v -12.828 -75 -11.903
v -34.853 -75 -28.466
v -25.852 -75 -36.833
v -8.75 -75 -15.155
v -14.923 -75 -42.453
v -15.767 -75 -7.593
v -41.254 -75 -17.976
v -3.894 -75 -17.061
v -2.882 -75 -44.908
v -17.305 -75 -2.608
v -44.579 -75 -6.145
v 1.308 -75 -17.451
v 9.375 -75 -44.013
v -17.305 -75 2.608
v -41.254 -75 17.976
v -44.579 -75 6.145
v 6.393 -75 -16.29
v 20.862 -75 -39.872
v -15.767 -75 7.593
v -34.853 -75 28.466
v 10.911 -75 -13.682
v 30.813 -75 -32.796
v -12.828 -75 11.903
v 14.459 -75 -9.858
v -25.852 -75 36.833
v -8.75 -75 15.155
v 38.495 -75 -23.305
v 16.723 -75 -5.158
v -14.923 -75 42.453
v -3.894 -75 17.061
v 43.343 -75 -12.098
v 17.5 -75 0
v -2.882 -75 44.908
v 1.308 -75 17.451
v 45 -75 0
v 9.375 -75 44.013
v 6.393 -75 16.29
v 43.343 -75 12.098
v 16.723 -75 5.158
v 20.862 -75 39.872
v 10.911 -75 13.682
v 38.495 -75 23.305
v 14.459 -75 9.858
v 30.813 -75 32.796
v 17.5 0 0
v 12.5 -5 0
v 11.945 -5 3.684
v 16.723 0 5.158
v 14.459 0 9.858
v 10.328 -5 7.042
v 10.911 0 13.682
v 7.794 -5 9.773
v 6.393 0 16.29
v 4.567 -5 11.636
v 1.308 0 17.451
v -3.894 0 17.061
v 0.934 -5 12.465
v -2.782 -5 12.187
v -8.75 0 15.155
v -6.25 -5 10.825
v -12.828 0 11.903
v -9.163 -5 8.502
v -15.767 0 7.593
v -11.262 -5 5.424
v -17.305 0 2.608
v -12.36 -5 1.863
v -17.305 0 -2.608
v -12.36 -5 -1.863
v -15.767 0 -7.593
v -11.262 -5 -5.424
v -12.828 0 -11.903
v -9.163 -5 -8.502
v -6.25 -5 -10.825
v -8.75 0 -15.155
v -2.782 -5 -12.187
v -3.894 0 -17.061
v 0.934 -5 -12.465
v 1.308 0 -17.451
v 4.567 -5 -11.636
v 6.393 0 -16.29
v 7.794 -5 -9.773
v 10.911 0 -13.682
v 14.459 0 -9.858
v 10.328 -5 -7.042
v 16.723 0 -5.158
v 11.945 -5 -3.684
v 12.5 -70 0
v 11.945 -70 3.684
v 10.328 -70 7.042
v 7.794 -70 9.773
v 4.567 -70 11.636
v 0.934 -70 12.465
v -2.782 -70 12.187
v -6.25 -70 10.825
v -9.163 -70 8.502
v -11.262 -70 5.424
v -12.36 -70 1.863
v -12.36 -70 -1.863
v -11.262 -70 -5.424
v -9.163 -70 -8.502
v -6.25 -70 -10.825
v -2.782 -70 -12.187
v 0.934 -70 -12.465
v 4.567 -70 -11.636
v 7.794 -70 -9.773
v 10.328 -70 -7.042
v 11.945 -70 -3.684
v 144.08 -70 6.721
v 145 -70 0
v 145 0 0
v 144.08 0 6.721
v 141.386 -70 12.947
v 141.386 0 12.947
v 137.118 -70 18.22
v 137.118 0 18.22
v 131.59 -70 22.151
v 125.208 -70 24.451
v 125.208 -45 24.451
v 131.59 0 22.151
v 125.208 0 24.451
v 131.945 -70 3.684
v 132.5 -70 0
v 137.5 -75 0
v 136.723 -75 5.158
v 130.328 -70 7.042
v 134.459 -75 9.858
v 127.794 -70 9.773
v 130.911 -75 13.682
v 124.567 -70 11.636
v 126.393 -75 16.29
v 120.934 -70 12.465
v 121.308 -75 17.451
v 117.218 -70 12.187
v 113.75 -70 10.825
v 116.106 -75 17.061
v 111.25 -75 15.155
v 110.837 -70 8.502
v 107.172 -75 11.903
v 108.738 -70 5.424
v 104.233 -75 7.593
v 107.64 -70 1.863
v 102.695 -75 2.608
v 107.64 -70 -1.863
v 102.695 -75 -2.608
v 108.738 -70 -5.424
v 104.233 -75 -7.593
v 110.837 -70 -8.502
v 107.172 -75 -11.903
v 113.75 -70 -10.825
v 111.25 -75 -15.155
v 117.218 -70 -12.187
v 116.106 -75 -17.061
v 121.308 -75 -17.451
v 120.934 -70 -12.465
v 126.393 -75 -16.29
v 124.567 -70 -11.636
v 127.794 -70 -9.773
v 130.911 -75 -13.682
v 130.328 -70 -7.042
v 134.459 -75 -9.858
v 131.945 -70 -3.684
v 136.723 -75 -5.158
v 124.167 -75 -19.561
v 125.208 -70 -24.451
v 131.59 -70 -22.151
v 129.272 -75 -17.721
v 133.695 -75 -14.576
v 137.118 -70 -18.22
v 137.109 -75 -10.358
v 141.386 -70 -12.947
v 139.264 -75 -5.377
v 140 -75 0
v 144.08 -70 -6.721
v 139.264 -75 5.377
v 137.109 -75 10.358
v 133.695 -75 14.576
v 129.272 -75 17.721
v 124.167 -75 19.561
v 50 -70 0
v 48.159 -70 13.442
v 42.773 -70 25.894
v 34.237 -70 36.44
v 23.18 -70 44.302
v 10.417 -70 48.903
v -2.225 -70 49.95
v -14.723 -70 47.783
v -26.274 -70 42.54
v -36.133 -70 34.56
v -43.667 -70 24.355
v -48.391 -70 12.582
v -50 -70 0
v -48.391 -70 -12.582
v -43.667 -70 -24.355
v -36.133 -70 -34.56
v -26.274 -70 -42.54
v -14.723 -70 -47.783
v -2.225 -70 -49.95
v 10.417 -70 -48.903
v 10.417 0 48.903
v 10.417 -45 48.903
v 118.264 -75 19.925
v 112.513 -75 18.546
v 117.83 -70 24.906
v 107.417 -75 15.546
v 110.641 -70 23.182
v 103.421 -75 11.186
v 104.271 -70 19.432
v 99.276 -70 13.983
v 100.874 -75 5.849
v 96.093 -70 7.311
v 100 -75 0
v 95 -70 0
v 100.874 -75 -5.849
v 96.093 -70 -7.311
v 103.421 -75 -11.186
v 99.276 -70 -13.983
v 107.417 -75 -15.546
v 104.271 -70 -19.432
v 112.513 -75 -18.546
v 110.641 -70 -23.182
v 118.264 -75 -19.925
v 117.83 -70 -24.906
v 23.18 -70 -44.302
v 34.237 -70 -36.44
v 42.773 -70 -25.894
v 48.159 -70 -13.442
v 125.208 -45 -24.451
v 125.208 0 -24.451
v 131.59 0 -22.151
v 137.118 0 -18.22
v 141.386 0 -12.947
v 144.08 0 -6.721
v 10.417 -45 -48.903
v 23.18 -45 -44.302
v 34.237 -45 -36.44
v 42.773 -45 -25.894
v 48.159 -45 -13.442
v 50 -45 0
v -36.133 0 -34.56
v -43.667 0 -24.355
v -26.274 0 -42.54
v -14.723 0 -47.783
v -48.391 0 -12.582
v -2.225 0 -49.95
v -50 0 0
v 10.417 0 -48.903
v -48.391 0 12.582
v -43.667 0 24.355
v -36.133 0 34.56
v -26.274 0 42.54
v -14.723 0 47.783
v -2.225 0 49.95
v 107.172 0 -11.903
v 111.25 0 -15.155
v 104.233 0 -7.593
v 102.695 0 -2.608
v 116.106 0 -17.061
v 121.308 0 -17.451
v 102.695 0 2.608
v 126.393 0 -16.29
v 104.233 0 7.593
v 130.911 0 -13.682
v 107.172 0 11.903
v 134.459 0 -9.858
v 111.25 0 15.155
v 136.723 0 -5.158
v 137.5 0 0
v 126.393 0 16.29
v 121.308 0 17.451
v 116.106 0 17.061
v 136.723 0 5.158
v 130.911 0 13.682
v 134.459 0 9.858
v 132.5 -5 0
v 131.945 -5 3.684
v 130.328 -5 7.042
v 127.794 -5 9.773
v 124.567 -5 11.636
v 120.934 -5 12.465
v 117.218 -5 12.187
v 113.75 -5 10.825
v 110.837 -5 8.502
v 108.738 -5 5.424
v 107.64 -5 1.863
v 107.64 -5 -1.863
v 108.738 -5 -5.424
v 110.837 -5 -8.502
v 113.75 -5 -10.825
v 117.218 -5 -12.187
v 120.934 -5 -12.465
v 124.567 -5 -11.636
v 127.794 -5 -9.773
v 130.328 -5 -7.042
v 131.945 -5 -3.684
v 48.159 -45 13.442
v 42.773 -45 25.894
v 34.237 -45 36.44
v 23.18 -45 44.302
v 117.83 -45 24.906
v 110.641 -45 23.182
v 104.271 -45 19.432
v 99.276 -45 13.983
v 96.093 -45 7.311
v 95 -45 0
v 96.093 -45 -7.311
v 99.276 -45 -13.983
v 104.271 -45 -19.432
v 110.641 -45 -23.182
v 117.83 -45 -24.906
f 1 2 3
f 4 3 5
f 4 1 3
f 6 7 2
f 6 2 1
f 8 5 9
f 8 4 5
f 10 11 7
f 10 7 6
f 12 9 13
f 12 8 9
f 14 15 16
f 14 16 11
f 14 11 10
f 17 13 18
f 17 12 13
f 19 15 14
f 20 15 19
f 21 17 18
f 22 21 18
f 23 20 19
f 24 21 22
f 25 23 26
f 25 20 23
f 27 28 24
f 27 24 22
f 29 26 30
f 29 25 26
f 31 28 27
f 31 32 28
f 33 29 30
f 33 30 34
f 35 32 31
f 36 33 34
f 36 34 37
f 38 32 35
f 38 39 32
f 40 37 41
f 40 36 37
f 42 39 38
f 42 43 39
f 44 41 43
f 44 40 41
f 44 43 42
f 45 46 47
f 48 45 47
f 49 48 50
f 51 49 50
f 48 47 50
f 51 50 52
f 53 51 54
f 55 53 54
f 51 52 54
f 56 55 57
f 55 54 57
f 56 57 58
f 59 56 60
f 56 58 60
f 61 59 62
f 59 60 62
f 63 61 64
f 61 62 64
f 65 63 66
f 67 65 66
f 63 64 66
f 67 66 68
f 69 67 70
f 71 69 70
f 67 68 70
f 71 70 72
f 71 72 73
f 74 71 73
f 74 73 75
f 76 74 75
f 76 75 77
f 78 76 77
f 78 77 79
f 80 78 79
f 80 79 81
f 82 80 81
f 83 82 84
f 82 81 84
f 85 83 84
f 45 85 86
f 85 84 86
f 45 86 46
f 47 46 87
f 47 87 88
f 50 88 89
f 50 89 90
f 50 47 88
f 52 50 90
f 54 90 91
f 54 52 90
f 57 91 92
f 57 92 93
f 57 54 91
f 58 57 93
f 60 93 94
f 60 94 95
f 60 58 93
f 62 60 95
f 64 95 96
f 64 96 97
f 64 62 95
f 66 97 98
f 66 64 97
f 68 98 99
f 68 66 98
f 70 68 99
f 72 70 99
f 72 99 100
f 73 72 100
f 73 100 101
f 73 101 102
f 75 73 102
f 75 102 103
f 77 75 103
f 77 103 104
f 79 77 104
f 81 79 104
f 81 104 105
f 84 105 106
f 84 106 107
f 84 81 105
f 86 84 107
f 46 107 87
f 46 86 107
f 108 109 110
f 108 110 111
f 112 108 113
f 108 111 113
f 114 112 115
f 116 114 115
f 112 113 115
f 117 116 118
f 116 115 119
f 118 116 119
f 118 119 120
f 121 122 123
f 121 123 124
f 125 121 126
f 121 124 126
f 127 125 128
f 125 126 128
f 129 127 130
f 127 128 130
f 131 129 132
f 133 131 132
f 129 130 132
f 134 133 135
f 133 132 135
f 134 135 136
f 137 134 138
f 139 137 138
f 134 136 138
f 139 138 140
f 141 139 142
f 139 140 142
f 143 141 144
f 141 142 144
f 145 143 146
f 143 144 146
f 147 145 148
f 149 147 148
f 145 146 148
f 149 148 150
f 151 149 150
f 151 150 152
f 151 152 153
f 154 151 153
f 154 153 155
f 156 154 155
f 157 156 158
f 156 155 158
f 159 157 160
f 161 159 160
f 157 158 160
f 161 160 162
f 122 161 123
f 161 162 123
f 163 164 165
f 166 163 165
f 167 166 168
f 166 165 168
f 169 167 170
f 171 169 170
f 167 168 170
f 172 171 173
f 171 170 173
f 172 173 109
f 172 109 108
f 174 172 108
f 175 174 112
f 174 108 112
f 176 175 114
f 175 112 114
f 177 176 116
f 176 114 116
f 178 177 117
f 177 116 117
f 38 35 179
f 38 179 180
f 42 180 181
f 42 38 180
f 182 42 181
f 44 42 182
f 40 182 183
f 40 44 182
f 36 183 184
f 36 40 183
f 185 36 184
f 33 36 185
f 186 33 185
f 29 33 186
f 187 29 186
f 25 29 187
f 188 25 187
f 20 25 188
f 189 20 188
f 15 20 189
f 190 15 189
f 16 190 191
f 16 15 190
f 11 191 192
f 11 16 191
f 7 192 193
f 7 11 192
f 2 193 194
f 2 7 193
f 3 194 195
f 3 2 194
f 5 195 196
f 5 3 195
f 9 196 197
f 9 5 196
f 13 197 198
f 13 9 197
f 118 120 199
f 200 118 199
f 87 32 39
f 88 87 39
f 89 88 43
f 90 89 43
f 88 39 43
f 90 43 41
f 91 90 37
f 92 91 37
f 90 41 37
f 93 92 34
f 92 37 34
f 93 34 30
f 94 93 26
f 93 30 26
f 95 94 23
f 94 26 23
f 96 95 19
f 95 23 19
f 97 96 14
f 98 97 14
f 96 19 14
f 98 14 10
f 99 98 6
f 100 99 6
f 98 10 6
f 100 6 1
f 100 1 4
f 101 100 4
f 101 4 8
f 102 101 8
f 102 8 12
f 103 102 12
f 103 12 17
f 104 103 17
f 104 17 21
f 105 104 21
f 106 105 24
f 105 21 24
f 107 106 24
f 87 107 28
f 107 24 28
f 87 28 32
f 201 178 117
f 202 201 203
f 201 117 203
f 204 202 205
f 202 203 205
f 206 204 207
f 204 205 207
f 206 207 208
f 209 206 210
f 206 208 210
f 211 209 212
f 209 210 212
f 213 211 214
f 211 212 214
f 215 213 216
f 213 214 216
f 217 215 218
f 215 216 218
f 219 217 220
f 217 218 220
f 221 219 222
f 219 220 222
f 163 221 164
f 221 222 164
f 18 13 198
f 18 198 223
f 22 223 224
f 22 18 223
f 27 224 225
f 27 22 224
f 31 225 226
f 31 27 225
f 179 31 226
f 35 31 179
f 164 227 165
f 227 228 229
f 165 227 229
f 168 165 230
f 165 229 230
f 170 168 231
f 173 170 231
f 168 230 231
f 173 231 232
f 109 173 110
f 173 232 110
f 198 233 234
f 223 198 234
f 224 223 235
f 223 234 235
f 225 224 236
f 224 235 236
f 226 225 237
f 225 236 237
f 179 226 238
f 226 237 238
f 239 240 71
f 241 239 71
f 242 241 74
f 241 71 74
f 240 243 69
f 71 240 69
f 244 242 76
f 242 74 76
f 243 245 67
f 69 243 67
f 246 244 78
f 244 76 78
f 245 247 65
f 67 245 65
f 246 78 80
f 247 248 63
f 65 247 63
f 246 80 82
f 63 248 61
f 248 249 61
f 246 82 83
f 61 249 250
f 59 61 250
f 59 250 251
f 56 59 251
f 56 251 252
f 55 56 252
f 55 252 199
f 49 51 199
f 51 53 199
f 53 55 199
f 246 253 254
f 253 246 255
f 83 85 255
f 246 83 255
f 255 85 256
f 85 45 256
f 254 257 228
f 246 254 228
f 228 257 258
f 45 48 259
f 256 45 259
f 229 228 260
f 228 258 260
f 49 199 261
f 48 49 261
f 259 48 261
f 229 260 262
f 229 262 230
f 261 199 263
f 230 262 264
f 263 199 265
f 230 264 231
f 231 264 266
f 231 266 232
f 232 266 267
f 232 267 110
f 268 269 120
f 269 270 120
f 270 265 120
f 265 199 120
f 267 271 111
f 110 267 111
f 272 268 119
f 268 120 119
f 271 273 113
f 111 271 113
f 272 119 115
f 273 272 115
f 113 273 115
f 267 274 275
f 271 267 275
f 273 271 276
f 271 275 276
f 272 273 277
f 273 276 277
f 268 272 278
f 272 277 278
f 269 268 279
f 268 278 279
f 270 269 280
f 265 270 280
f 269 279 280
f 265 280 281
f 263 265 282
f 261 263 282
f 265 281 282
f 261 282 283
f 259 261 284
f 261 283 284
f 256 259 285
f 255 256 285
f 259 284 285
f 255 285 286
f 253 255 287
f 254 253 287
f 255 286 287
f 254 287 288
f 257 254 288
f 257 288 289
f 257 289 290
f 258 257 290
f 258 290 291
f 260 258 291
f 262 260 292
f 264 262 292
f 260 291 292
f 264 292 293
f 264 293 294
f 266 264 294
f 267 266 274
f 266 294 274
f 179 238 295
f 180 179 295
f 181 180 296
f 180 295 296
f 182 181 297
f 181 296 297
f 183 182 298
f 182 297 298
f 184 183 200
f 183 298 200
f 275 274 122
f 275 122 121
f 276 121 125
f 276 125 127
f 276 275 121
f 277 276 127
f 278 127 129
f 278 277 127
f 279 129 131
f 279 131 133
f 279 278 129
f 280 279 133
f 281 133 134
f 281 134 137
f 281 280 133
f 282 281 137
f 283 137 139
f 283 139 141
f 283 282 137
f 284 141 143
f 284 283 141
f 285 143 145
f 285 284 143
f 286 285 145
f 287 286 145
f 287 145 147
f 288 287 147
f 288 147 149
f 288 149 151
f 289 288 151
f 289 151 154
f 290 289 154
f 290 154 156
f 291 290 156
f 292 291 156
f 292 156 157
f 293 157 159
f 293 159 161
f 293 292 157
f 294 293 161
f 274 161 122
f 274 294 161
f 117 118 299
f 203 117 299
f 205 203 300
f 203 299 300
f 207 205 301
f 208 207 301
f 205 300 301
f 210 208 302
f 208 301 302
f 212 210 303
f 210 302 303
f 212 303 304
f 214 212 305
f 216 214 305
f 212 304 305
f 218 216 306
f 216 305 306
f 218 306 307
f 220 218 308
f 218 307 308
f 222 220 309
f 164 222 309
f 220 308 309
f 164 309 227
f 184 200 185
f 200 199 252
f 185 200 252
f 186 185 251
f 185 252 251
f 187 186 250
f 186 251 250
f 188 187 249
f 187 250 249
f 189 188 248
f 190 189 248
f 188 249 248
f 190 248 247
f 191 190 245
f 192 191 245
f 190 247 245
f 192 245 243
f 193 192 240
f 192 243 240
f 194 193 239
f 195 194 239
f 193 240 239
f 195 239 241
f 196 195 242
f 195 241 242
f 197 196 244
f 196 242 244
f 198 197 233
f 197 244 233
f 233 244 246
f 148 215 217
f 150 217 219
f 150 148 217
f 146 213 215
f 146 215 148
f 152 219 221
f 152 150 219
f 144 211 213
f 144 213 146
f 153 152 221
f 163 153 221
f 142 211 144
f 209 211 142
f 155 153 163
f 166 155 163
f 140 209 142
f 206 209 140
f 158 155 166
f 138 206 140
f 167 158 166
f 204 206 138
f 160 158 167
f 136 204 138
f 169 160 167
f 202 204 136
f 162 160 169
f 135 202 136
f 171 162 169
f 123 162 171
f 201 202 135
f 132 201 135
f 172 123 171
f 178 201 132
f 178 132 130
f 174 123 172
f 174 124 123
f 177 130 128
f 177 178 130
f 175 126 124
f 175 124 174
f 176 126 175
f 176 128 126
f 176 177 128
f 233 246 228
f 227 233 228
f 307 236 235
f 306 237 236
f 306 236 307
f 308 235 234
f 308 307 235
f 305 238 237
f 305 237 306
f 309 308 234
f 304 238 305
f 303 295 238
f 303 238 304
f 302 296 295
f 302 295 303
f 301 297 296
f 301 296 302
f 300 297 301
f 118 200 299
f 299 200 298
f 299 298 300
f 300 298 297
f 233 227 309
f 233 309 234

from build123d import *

# Parameters (mm, degrees)
F0_R     = 12.5
F1_DEPTH = 45
F2_DEPTH = 75
F3_SIZE  = 5
F4_SIZE  = 5
F5_DEPTH = 15


with BuildPart() as f1:
    # F0 (on Front) → F1 (new body)
    with BuildSketch(Plane.XZ):
        with BuildLine():
            ThreePointArc((10.416667, -48.902894), (38.864079, -31.457643), (50, 0))
            ThreePointArc((50, 0), (38.864079, 31.457643), (10.416667, 48.902894))
            ThreePointArc((10.416667, 48.902894), (-50, 0), (10.416667, -48.902894))
        make_face()
        Circle(F0_R, mode=Mode.SUBTRACT)
        with BuildLine():
            ThreePointArc((10.416667, 48.902894), (38.864079, 31.457643), (50, 0))
            ThreePointArc((50, 0), (38.864079, -31.457643), (10.416667, -48.902894))
            Line((10.416667, -48.902894), (125.208333, -24.451447))
            ThreePointArc((125.208333, -24.451447), (95, 0), (125.208333, 24.451447))
            Line((125.208333, 24.451447), (10.416667, 48.902894))
        make_face()
        with BuildLine():
            ThreePointArc((145, 0), (139.43204, 15.728822), (125.208333, 24.451447))
            ThreePointArc((125.208333, 24.451447), (95, 0), (125.208333, -24.451447))
            ThreePointArc((125.208333, -24.451447), (139.43204, -15.728822), (145, 0))
        make_face()
        with Locations((120, 0)):
            Circle(F0_R, mode=Mode.SUBTRACT)
    extrude(amount=F1_DEPTH)

    # F0 (on Front) → F2 (join)
    with BuildSketch(Plane.XZ):
        with BuildLine():
            ThreePointArc((10.416667, -48.902894), (38.864079, -31.457643), (50, 0))
            ThreePointArc((50, 0), (38.864079, 31.457643), (10.416667, 48.902894))
            ThreePointArc((10.416667, 48.902894), (-50, 0), (10.416667, -48.902894))
        make_face()
        Circle(F0_R, mode=Mode.SUBTRACT)
        with BuildLine():
            ThreePointArc((145, 0), (139.43204, 15.728822), (125.208333, 24.451447))
            ThreePointArc((125.208333, 24.451447), (95, 0), (125.208333, -24.451447))
            ThreePointArc((125.208333, -24.451447), (139.43204, -15.728822), (145, 0))
        make_face()
        with Locations((120, 0)):
            Circle(F0_R, mode=Mode.SUBTRACT)
    extrude(amount=F2_DEPTH)

    # F3
    f3_edges = [f1.edges().sort_by_distance(p)[0] for p in [
        (-10.416667, -75, 48.902894),
        (-12.5, -75, 0),
        (114.791667, -75, 24.451447),
        (107.5, -75, 0),
    ]]
    chamfer(f3_edges, length=F3_SIZE)

    # F4
    f4_edges = [f1.edges().sort_by_distance(p)[0] for p in [
        (107.5, 0, 0),
        (-12.5, 0, 0),
    ]]
    chamfer(f4_edges, length=F4_SIZE)

    # F0 (on Front) → F5 (join)
    with BuildSketch(Plane.XZ):
        with BuildLine():
            ThreePointArc((10.416667, 48.902894), (38.864079, 31.457643), (50, 0))
            ThreePointArc((50, 0), (38.864079, -31.457643), (10.416667, -48.902894))
            Line((10.416667, -48.902894), (125.208333, -24.451447))
            ThreePointArc((125.208333, -24.451447), (95, 0), (125.208333, 24.451447))
            Line((125.208333, 24.451447), (10.416667, 48.902894))
        make_face()
    extrude(amount=F5_DEPTH)


solid = f1.part
